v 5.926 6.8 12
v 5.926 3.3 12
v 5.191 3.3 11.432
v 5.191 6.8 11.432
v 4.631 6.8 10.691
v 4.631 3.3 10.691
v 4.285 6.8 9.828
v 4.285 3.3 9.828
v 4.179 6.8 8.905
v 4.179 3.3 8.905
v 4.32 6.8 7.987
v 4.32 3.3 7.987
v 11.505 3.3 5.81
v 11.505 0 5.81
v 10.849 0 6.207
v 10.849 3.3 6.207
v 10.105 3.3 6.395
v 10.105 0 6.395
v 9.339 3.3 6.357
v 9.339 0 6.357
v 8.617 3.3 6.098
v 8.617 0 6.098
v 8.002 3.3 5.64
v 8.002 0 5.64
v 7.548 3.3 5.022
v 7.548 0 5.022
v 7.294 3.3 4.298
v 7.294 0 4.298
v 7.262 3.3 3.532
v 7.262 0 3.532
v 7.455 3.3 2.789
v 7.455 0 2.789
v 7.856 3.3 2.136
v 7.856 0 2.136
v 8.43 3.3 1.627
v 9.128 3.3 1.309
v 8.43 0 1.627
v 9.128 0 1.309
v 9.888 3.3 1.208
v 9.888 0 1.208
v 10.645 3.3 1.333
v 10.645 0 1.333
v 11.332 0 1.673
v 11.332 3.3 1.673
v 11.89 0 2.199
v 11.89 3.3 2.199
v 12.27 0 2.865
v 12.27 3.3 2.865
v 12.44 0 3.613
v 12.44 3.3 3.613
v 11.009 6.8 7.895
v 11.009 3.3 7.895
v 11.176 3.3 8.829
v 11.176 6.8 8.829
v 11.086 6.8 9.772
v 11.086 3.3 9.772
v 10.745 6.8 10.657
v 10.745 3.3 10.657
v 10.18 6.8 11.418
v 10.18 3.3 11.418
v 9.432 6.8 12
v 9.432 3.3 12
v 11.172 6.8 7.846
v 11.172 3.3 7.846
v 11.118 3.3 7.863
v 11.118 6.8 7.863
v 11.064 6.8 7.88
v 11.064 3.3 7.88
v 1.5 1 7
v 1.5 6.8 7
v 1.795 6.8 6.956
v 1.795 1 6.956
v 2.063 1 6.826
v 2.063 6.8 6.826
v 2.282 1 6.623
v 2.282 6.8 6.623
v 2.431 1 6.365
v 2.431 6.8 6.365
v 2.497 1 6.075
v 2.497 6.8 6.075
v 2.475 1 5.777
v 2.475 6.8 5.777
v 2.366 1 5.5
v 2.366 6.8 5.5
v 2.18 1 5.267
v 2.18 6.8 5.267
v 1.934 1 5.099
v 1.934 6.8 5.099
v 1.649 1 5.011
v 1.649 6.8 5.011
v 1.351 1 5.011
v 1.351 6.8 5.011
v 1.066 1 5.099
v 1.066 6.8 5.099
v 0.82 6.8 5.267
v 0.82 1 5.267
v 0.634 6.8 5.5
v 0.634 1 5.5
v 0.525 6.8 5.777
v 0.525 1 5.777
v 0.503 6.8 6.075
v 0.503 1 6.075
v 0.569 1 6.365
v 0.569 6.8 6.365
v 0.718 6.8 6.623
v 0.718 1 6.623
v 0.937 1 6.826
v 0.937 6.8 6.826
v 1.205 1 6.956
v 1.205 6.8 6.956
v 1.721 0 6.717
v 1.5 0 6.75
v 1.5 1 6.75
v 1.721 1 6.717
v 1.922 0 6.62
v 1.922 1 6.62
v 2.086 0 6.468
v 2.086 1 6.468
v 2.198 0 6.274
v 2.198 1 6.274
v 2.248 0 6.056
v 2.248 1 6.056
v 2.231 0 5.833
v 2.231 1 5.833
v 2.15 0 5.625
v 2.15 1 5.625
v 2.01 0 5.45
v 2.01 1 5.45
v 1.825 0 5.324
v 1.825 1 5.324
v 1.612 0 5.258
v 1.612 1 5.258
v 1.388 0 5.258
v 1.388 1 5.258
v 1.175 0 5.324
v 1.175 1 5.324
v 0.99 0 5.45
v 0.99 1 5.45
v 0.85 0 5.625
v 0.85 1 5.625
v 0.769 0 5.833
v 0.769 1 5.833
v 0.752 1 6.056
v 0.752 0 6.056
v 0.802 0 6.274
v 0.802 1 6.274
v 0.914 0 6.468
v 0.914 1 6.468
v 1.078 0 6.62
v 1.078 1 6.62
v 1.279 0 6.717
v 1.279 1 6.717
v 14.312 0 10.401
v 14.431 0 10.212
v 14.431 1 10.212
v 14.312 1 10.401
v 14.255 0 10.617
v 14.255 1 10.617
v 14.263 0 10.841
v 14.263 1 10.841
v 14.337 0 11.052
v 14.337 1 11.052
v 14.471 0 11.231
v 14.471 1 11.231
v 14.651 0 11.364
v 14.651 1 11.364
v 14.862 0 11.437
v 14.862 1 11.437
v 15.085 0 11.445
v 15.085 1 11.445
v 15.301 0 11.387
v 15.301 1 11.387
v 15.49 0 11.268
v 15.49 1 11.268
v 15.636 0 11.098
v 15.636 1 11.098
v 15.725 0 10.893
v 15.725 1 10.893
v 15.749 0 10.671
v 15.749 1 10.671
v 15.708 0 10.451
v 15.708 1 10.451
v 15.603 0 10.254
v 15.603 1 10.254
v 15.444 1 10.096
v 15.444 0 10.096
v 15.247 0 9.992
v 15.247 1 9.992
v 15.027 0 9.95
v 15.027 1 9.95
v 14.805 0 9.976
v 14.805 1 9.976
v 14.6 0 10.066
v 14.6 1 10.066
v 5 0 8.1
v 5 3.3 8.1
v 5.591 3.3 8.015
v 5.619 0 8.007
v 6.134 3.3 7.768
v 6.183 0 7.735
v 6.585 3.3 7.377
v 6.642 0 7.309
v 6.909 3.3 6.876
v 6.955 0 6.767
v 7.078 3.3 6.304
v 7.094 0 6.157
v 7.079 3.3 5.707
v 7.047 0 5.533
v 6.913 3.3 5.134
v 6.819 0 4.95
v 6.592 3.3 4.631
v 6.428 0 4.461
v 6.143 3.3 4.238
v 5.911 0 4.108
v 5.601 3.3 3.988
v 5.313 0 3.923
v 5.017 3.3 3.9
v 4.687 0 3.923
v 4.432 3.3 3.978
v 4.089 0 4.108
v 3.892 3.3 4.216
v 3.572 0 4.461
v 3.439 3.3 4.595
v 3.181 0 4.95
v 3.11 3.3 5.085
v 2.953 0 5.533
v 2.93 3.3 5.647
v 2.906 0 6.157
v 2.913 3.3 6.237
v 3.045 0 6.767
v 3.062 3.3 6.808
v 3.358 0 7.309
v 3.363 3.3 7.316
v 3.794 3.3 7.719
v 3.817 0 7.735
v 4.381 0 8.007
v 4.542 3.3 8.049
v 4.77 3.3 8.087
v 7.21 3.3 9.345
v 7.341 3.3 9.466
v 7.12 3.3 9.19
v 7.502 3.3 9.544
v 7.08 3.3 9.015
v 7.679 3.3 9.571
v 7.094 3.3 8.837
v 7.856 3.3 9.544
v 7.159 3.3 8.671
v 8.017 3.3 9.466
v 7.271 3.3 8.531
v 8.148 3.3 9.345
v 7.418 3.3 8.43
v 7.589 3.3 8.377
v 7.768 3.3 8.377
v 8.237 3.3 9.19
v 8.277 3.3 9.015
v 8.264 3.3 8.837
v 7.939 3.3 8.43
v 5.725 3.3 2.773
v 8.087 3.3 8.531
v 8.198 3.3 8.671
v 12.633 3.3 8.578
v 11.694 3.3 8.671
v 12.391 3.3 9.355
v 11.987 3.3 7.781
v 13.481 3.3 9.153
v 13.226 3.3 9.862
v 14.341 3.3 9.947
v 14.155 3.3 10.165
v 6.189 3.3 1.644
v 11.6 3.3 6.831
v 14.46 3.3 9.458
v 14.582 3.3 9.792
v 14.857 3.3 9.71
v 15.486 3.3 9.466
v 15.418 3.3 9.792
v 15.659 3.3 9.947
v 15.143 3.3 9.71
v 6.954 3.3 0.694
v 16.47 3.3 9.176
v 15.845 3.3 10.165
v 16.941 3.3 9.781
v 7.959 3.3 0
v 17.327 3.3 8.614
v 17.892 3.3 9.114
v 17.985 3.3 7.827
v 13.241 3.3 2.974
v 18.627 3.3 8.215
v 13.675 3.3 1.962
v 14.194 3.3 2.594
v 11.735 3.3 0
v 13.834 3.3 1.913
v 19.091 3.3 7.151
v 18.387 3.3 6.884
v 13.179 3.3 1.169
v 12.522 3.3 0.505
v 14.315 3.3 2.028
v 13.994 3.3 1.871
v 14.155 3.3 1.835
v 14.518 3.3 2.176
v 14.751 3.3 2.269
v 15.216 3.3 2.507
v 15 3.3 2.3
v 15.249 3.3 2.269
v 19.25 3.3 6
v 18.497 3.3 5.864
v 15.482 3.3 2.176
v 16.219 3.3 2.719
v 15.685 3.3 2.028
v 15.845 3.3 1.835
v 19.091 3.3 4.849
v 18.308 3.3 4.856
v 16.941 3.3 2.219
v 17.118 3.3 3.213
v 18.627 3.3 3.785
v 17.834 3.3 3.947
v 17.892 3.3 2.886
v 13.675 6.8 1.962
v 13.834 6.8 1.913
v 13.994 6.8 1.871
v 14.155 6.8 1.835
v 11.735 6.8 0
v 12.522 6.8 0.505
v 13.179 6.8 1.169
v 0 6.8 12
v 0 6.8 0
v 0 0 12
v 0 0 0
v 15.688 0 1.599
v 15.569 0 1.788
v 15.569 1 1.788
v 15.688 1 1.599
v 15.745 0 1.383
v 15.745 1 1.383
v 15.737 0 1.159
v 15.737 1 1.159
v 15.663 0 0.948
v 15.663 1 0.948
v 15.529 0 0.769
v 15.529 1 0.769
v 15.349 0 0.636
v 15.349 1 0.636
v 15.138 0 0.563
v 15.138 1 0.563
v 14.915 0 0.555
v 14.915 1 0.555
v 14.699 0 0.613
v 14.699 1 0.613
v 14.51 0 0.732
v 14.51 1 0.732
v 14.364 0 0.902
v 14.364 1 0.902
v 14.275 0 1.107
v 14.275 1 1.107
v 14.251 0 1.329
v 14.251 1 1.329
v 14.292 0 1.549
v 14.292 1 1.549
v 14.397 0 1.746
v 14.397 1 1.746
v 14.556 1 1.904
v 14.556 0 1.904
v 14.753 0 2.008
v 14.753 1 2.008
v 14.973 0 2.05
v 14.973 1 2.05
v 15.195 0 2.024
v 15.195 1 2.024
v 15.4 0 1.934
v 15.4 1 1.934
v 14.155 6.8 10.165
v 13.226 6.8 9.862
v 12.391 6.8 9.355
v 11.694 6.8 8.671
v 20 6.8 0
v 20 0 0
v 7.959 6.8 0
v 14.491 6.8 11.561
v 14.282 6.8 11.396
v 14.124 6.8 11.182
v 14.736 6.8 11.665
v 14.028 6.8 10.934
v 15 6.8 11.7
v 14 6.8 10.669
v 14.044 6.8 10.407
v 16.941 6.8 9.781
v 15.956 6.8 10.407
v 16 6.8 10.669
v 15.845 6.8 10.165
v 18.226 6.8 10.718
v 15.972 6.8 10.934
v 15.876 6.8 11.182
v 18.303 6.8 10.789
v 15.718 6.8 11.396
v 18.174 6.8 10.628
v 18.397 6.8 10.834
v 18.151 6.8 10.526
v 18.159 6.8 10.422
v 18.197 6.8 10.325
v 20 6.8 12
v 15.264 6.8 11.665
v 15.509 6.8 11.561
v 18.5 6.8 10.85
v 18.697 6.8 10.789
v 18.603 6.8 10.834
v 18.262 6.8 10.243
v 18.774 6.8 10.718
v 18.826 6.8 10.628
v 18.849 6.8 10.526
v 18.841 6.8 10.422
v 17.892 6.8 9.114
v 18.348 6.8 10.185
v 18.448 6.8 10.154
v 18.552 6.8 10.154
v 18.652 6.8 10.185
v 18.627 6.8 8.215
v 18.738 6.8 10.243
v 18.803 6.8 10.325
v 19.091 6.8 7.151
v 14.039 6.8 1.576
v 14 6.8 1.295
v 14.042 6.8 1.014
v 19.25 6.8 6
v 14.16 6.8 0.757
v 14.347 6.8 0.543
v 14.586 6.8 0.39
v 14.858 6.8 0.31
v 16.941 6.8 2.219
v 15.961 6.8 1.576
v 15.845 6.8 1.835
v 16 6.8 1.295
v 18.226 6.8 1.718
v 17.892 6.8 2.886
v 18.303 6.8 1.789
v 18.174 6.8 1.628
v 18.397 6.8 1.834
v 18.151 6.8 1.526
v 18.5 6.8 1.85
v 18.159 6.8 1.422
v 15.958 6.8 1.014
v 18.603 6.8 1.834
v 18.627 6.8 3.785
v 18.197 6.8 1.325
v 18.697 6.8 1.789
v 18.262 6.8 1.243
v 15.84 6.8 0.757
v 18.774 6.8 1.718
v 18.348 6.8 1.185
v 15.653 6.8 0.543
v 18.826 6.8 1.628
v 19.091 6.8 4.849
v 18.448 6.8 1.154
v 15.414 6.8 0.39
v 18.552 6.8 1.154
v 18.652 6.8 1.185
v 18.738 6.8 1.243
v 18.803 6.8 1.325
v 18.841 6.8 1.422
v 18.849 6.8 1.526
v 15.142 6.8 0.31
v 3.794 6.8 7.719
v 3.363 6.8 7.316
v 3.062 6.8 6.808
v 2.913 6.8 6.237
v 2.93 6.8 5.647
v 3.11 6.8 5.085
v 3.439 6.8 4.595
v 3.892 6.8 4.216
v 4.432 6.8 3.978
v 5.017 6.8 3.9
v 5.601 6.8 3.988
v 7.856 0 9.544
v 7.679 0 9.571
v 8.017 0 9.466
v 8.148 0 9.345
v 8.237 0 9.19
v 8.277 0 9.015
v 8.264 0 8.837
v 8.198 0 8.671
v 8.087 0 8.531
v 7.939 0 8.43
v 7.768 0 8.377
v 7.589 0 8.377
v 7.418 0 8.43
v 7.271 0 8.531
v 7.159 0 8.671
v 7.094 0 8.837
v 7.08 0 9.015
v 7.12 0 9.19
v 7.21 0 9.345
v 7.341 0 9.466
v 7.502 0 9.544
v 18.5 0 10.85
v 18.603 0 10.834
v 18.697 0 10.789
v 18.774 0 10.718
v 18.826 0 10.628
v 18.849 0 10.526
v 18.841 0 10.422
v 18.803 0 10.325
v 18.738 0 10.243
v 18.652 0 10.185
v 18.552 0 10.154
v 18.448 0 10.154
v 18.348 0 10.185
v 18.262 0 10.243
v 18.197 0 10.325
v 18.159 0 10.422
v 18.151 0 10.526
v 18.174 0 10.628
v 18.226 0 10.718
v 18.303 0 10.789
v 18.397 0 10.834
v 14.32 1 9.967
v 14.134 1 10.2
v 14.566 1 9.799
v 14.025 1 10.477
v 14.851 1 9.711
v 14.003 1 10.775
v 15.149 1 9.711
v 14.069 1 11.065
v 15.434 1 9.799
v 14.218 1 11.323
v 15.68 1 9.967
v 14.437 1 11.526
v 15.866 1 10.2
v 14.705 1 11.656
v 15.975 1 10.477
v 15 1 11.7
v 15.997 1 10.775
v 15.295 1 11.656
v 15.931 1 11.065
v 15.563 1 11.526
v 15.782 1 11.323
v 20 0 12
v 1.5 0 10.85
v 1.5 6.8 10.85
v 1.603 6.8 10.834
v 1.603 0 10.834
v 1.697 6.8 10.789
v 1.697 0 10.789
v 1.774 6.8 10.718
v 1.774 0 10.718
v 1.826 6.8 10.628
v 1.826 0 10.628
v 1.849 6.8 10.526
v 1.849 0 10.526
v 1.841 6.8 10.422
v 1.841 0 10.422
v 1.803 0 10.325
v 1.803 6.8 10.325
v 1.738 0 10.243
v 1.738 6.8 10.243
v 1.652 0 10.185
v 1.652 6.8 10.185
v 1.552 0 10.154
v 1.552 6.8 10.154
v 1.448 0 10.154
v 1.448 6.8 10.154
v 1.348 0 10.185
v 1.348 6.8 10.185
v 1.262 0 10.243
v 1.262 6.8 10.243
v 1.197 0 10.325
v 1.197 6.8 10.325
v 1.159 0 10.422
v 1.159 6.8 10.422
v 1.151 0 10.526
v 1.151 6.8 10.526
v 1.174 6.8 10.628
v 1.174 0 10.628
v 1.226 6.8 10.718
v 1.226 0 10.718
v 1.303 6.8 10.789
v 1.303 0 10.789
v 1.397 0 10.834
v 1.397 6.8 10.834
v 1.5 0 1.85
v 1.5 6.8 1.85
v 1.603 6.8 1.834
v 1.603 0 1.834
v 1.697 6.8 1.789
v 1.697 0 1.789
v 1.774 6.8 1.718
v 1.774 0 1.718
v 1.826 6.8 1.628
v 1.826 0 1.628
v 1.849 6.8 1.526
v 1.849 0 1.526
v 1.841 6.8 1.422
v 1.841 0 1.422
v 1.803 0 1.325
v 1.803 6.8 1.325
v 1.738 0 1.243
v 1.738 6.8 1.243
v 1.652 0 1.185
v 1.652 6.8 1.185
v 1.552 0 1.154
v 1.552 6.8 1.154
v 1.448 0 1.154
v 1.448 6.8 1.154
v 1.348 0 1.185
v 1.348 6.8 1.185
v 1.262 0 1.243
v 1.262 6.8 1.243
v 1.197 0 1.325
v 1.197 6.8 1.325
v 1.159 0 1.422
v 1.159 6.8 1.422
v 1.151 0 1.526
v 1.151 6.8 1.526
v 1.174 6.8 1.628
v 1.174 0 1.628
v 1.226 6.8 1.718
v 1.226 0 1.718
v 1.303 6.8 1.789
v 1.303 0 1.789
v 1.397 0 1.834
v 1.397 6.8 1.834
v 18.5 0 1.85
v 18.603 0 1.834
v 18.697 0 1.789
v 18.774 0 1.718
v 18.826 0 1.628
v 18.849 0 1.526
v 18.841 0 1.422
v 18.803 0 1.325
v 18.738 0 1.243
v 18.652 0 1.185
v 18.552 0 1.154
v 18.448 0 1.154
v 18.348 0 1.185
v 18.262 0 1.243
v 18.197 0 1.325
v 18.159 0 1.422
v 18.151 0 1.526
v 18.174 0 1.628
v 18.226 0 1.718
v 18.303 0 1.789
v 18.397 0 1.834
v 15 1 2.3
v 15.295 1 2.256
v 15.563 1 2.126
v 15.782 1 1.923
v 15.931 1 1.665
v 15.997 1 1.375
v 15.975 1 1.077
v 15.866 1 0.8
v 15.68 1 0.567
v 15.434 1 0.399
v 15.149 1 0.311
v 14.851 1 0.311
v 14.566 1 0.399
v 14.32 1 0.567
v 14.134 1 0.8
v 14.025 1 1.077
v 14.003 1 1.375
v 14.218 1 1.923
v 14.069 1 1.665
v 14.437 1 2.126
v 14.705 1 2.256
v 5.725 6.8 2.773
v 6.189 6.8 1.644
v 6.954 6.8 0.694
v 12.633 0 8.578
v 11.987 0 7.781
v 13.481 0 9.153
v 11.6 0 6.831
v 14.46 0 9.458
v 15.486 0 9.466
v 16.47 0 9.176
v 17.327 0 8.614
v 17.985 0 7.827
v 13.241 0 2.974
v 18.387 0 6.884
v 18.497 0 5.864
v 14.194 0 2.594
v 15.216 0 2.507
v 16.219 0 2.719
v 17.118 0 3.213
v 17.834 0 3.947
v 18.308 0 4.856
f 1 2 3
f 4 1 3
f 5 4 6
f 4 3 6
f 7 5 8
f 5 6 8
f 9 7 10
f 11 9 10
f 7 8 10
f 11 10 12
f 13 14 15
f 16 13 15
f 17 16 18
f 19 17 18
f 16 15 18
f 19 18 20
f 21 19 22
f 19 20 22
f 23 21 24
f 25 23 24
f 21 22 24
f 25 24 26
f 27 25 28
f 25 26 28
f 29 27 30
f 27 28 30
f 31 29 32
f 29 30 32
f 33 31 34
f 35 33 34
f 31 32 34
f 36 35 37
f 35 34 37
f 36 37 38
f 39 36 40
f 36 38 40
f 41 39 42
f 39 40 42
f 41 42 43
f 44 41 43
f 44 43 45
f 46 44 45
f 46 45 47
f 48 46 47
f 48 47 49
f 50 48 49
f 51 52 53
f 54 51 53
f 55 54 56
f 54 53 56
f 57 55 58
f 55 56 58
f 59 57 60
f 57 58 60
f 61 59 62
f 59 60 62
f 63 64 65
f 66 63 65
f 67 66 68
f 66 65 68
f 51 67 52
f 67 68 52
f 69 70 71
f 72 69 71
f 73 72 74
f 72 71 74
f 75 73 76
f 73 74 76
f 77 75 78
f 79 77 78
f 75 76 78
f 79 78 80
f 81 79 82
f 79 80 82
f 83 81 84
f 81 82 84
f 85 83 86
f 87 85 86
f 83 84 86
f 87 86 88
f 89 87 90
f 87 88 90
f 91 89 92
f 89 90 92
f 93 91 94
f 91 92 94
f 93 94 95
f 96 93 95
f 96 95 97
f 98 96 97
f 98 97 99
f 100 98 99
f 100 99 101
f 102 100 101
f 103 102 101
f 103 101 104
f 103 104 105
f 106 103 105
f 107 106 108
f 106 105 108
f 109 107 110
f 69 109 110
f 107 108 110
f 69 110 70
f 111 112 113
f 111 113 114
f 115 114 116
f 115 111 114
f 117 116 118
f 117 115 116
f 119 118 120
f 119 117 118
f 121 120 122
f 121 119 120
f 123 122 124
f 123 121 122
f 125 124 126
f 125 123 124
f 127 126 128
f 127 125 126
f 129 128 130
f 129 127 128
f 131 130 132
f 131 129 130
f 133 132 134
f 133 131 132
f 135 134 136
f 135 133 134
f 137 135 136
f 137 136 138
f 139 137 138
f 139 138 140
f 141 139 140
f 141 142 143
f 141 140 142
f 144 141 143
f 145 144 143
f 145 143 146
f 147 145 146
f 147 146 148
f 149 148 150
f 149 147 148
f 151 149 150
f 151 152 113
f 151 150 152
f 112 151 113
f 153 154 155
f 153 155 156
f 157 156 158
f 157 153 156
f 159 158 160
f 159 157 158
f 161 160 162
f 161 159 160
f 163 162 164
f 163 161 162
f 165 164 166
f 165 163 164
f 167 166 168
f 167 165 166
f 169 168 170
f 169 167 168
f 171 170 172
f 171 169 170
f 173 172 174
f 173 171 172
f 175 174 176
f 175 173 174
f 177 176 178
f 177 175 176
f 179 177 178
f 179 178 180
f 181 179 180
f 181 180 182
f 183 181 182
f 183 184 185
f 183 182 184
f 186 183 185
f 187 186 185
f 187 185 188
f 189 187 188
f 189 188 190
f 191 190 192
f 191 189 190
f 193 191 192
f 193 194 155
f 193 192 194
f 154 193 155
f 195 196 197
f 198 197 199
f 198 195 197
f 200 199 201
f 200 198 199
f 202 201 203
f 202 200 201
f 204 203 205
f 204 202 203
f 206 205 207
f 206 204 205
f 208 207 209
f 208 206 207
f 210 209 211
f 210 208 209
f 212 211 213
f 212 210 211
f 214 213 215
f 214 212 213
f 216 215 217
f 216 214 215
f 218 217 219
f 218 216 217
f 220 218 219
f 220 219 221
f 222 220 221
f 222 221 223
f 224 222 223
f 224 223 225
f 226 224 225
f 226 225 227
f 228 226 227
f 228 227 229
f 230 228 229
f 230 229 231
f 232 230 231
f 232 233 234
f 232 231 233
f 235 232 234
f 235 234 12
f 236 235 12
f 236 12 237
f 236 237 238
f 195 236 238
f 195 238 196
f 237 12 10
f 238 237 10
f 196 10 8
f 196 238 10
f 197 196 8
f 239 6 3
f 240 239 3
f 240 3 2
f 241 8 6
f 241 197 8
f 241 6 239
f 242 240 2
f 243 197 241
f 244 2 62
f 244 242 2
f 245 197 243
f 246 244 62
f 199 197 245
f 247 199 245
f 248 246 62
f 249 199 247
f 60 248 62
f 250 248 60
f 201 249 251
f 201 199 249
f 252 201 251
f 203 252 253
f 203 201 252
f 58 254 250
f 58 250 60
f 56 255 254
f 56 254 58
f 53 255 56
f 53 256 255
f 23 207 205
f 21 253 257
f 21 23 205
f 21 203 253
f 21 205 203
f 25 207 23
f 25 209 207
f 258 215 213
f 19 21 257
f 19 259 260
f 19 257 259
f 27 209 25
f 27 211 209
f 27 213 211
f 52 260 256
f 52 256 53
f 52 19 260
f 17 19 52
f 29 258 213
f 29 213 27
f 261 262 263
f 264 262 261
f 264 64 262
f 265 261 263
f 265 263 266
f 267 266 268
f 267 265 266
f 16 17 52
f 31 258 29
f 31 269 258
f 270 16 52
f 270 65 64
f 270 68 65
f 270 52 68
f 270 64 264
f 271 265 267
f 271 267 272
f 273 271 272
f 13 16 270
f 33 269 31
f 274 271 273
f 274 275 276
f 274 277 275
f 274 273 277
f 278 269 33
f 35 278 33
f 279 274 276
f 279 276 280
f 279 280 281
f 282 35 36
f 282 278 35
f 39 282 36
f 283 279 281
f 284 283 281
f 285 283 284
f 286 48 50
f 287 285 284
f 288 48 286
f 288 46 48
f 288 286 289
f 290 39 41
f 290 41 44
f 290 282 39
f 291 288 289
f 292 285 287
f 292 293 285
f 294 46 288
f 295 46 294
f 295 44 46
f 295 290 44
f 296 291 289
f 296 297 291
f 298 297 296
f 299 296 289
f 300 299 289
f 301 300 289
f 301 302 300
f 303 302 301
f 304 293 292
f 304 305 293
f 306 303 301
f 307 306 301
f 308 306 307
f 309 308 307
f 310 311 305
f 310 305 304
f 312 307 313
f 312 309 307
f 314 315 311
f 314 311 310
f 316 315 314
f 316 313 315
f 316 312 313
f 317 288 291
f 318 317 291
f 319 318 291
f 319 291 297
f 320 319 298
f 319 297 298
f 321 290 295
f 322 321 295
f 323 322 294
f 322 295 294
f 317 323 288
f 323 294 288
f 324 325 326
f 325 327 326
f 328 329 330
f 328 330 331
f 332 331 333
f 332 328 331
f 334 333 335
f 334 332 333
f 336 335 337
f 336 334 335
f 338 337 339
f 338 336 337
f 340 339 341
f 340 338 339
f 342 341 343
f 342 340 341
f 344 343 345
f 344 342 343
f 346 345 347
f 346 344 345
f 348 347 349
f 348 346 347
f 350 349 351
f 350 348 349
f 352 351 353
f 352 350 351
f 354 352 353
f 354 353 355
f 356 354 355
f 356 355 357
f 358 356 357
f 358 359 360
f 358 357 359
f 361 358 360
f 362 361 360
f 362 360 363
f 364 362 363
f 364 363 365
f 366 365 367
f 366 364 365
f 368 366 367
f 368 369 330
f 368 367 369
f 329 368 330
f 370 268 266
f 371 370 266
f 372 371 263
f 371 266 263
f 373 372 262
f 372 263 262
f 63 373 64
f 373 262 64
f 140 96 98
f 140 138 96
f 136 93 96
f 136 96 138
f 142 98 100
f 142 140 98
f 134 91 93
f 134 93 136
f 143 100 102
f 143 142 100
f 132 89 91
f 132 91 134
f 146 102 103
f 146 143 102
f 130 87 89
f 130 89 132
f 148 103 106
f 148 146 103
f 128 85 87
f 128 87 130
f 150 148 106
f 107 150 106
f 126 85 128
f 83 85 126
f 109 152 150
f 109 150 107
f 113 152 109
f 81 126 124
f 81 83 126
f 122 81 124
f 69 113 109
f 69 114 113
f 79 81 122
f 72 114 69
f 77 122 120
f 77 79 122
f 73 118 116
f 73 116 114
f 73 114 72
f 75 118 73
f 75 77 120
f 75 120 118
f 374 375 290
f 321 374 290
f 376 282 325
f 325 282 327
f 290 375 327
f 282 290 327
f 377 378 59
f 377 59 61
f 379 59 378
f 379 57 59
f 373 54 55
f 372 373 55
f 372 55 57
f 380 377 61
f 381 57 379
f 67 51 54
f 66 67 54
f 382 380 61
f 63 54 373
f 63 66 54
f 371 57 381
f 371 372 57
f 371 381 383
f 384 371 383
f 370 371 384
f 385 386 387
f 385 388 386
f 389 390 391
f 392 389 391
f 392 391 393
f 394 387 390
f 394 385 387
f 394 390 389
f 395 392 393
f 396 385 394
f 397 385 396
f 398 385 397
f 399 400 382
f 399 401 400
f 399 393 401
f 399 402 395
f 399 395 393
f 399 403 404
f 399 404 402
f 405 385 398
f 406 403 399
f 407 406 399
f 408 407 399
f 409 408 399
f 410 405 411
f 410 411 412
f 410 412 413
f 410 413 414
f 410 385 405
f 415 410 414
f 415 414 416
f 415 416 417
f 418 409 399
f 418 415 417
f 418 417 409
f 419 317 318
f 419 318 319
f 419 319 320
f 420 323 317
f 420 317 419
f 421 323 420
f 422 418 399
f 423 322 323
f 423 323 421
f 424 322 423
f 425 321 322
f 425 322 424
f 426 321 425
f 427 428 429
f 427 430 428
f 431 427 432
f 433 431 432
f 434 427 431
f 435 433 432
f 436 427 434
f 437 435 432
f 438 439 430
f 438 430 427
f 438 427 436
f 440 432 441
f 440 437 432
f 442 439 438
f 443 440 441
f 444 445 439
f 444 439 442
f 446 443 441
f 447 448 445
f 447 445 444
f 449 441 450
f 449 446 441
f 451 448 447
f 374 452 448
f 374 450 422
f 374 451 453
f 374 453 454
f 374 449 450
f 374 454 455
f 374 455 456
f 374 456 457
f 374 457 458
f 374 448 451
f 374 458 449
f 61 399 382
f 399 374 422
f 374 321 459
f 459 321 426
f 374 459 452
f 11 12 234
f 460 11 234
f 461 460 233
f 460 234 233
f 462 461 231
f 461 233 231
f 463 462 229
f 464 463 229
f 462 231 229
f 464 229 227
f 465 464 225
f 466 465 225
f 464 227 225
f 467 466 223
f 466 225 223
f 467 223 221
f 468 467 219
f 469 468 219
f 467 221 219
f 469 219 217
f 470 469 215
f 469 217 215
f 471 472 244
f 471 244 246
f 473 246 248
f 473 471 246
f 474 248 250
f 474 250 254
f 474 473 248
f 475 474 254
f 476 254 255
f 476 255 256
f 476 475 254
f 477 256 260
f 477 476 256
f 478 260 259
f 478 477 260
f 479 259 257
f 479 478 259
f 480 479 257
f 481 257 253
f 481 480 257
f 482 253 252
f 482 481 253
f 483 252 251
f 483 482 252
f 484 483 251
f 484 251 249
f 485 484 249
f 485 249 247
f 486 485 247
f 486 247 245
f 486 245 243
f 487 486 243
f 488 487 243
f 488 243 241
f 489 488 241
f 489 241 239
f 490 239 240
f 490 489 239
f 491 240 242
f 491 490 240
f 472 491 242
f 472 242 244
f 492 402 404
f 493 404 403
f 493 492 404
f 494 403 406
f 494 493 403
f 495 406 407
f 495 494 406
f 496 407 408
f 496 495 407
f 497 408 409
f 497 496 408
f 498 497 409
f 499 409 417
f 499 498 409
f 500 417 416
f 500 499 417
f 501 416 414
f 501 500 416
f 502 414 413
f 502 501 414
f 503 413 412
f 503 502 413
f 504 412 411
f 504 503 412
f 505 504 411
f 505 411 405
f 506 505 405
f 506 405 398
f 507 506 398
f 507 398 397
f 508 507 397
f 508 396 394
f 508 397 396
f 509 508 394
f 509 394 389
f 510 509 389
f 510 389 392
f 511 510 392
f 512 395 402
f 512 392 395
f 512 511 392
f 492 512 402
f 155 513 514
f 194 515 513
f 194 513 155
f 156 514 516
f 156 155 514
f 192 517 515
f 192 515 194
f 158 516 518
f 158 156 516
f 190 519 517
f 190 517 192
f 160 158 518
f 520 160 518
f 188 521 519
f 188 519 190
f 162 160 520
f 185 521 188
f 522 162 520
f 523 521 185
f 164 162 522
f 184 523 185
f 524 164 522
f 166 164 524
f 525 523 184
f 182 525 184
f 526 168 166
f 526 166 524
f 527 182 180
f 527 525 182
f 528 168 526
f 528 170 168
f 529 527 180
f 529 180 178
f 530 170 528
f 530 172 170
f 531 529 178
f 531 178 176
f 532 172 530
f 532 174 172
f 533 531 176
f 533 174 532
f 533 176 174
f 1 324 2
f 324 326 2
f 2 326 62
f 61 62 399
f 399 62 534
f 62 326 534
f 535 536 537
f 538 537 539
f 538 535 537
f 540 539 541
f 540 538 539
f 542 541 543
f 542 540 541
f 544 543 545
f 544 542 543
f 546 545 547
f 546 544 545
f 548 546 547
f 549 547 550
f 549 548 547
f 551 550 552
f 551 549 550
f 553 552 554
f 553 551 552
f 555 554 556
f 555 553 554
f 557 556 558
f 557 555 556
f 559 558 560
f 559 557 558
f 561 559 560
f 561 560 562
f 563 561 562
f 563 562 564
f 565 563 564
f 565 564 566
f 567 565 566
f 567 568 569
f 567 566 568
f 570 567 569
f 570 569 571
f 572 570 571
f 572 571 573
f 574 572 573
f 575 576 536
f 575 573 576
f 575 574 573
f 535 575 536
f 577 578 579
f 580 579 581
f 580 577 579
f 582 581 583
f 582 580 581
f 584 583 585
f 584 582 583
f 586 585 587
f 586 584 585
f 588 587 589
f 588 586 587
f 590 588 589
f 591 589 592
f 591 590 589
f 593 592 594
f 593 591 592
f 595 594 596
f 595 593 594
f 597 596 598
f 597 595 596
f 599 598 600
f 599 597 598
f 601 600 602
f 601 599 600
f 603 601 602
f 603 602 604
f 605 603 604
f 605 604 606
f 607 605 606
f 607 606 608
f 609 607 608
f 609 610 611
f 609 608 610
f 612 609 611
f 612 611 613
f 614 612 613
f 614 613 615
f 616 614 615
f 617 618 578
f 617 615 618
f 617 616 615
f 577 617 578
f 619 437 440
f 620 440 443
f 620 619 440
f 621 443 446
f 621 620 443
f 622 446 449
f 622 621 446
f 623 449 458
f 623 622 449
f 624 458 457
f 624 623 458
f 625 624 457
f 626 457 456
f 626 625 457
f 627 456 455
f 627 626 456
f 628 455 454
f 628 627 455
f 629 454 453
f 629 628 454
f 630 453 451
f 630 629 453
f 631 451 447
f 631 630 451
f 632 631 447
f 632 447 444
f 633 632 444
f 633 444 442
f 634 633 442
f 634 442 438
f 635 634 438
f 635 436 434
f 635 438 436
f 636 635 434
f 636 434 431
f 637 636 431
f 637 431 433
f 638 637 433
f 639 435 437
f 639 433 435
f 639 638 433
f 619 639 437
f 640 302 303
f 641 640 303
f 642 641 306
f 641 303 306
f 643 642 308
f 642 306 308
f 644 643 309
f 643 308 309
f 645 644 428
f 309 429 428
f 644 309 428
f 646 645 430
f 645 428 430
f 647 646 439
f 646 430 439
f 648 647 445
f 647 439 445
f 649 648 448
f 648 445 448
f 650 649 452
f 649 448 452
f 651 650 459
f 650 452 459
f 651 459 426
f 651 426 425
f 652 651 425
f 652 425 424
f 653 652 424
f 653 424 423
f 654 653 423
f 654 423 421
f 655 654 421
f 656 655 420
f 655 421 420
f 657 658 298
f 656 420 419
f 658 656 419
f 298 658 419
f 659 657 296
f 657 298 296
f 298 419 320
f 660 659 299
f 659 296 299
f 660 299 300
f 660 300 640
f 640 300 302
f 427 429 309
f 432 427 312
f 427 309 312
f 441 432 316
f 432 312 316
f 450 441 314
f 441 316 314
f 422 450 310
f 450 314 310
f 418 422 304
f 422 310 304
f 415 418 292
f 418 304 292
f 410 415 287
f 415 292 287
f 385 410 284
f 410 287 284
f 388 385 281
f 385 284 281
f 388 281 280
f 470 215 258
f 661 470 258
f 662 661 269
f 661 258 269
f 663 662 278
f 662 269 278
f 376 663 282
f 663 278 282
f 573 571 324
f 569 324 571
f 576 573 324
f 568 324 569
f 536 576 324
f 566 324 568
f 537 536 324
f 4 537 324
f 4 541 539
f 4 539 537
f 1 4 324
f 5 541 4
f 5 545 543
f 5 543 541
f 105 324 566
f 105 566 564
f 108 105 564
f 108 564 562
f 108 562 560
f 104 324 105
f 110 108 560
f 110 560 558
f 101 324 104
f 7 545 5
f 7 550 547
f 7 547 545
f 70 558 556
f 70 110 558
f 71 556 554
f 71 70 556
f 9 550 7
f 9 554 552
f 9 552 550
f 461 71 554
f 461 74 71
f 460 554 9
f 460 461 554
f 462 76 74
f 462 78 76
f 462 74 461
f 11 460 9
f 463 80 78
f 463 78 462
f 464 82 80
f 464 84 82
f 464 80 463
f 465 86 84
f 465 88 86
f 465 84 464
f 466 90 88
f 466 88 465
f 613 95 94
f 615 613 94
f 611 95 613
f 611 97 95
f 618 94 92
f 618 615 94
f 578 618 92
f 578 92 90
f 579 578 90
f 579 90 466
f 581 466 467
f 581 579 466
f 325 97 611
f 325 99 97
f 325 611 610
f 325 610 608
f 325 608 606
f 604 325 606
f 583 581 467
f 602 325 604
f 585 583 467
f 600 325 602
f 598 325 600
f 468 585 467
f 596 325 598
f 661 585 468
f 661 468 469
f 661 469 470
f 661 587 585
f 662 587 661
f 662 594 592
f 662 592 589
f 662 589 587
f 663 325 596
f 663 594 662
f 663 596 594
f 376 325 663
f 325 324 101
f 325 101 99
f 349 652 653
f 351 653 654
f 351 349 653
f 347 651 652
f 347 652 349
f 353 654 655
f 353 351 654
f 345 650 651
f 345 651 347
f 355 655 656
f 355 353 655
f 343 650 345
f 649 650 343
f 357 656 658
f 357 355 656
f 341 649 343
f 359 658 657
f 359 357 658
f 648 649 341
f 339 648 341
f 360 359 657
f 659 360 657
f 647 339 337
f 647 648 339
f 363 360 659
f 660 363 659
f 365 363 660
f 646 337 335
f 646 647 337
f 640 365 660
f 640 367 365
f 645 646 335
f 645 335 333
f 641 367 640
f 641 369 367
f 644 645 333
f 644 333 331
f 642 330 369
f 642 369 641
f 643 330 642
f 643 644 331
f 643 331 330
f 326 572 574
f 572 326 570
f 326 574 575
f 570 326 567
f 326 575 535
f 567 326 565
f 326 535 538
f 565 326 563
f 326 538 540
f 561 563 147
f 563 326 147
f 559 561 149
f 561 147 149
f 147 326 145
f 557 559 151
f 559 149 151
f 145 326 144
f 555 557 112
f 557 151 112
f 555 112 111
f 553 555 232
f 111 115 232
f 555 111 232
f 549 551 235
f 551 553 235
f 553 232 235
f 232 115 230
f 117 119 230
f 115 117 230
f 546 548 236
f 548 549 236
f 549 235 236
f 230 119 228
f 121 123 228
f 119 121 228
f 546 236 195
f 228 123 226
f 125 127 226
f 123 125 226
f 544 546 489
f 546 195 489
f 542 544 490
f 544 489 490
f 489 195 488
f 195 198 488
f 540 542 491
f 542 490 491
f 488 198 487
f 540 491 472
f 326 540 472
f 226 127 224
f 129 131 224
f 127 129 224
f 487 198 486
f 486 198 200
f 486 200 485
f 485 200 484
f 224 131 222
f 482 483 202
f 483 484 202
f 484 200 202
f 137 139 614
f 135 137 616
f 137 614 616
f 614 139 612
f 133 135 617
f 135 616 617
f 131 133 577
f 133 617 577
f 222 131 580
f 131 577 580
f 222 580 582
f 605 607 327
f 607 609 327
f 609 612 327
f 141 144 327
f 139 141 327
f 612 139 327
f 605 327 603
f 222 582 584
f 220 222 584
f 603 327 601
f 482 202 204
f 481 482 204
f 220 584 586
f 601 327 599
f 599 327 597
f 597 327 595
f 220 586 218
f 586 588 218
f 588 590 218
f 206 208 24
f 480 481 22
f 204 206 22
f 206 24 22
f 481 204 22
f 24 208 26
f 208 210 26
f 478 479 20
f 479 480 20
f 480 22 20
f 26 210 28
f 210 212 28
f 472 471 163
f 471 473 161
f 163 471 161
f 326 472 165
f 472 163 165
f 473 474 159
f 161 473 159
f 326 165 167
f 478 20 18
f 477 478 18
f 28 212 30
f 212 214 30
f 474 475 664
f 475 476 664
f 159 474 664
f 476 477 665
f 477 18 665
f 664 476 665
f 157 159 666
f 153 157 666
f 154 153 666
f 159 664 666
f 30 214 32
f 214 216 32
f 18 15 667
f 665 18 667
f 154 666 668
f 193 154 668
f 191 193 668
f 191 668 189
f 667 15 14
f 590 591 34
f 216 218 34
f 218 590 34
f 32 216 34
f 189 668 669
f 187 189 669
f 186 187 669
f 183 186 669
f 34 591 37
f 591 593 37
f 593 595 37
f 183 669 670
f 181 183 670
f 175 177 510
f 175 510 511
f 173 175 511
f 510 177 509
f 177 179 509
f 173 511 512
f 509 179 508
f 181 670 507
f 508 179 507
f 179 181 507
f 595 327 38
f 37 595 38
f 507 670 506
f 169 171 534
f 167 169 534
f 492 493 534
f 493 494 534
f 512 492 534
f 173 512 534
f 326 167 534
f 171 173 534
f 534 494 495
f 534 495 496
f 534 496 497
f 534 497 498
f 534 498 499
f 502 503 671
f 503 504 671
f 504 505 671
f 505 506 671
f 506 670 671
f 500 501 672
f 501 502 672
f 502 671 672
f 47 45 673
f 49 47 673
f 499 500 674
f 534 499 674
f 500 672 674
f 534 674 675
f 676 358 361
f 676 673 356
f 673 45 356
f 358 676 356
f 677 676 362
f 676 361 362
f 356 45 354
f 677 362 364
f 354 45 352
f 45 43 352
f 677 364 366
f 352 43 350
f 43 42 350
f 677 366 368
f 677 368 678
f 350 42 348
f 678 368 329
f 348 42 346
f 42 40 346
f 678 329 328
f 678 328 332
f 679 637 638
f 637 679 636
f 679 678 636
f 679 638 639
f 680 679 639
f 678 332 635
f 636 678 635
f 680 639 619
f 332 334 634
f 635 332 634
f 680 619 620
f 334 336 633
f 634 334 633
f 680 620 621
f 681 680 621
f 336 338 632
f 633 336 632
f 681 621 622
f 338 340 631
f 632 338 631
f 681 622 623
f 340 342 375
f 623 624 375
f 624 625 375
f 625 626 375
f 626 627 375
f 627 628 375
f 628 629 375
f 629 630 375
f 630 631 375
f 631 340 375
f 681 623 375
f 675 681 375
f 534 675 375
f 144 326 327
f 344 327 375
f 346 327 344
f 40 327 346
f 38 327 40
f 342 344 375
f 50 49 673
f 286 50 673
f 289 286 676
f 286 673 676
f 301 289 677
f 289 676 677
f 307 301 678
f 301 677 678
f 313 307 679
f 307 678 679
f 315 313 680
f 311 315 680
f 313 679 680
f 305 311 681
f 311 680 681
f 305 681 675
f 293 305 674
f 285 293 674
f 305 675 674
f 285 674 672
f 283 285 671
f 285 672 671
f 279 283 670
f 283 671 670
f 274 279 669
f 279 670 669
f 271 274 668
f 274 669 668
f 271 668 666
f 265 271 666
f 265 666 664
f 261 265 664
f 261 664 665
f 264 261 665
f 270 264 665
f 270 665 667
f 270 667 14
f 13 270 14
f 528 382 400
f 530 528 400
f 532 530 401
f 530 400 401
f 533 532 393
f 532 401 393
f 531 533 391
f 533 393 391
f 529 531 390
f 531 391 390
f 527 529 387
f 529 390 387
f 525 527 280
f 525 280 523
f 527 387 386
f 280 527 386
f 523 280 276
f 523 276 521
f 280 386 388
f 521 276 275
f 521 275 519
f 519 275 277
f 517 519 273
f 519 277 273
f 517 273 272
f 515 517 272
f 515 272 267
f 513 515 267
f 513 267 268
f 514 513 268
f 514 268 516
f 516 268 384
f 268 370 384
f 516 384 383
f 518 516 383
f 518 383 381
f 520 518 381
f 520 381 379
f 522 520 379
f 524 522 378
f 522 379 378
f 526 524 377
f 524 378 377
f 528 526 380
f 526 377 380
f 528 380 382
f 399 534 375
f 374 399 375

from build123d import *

# Parameters (mm, degrees)
SKETCH_1_W          = 20
SKETCH_1_H          = 12
SKETCH_1_R          = 2.1
SKETCH_1_R_2        = 0.6
EXTRUDE_1_DEPTH     = 3.3
EXTRUDE_START       = 3.3
EXTRUDE_4_DEPTH     = 3.5
SKETCH_2_R          = 0.75
CUT_EXTRUDE_1_DEPTH = 29.930952283
CUT_EXTRUDE_START   = 24
SKETCH_2_4_R        = 1
CUT_EXTRUDE_2_DEPTH = 5.8
SKETCH_3_R          = 0.35
CUT_EXTRUDE_3_DEPTH = 25.294855422


with BuildPart() as part:
    # 草图1 → 凸台-拉伸1 (new body)
    with BuildSketch(Plane(origin=(0, 0, 0), x_dir=(1, 0, 0), z_dir=(0, 1, 0))):
        with Locations((10, -6)):
            Rectangle(SKETCH_1_W, SKETCH_1_H)
        with BuildLine():
            ThreePointArc((12.439835428, -3.613463312), (18.220575086, -7.370363498), (11.50515478, -5.81011348))
            ThreePointArc((11.50515478, -5.81011348), (7.454652656, -2.789434091), (12.439835428, -3.613463312))
        make_face(mode=Mode.SUBTRACT)
        with Locations(Location((5, -6, 0), (0, 0, 270))):
            Circle(SKETCH_1_R, mode=Mode.SUBTRACT)
        with Locations(Location((7.678736094, -8.970584613, 0), (0, 0, 270))):
            Circle(SKETCH_1_R_2, mode=Mode.SUBTRACT)
    extrude(amount=EXTRUDE_1_DEPTH)

    # 草图1<6> → 凸台-拉伸4 (add)
    with BuildSketch(Plane(origin=(0, 0, 0), x_dir=(1, 0, 0), z_dir=(0, 1, 0)).offset(EXTRUDE_START)):
        with BuildLine():
            Line((7.958677072, 0), (0, 0))
            Line((0, 0), (0, -12))
            Line((0, -12), (5.925840657, -12))
            ThreePointArc((5.925840657, -12), (4.429268792, -10.270954659), (4.319841502, -7.986802561))
            ThreePointArc((4.319841502, -7.986802561), (3.000111311, -5.359340003), (5.600909971, -3.987810345))
            ThreePointArc((5.600909971, -3.987810345), (6.188678117, -1.644412009), (7.958677072, 0))
        make_face()
        with BuildLine():
            Line((20, 0), (11.735482653, 0))
            ThreePointArc((11.735482653, 0), (12.869036074, -0.819060885), (13.675372646, -1.961700559))
            ThreePointArc((13.675372646, -1.961700559), (18.910698319, -7.664012819), (11.171707216, -7.845717845))
            ThreePointArc((11.171707216, -7.845717845), (11.090844977, -7.871351024), (11.009487245, -7.895365208))
            ThreePointArc((11.009487245, -7.895365208), (10.945672327, -10.226422042), (9.43163153, -12))
            Line((9.43163153, -12), (20, -12))
            Line((20, -12), (20, 0))
        make_face()
    extrude(amount=EXTRUDE_4_DEPTH)

    # 草图2 → 切除-拉伸1 (cut, through all)
    with BuildSketch(Plane(origin=(5, -17.2, 6), x_dir=(0, 0, -1), z_dir=(0, 1, 0))):
        with Locations(Location((0, 3.5, 0), (0, 0, 180))):
            Circle(SKETCH_2_R)
        with Locations(Location((-4.7, -10, 0), (0, 0, 49.37814182))):
            Circle(SKETCH_2_R)
        with Locations(Location((4.7, -10, 0), (0, 0, 229.37814182))):
            Circle(SKETCH_2_R)
    extrude(amount=CUT_EXTRUDE_1_DEPTH, mode=Mode.SUBTRACT)

    # 草图2<4> → 切除-拉伸2 (cut)
    with BuildSketch(Plane(origin=(5, -17.2, 6), x_dir=(0, 0, -1), z_dir=(0, 1, 0)).offset(CUT_EXTRUDE_START)):
        with Locations(Location((0, 3.5, 0), (0, 0, 180))):
            Circle(SKETCH_2_4_R)
        with Locations(Location((-4.7, -10, 0), (0, 0, 180))):
            Circle(SKETCH_2_4_R)
        with Locations(Location((4.7, -10, 0), (0, 0, 180))):
            Circle(SKETCH_2_4_R)
    extrude(amount=-CUT_EXTRUDE_2_DEPTH, mode=Mode.SUBTRACT)

    # 草图3 → 切除-拉伸3 (cut, through all)
    with BuildSketch(Plane(origin=(0, 0, 0), x_dir=(1, 0, 0), z_dir=(0, 1, 0))):
        with Locations(Location((1.5, -1.5, 0), (0, 0, 270))):
            Circle(SKETCH_3_R)
        with Locations(Location((1.5, -10.5, 0), (0, 0, 270))):
            Circle(SKETCH_3_R)
        with Locations(Location((18.5, -10.5, 0), (0, 0, 270))):
            Circle(SKETCH_3_R)
        with Locations(Location((18.5, -1.5, 0), (0, 0, 270))):
            Circle(SKETCH_3_R)
    extrude(amount=CUT_EXTRUDE_3_DEPTH, mode=Mode.SUBTRACT)


solid = part.part
